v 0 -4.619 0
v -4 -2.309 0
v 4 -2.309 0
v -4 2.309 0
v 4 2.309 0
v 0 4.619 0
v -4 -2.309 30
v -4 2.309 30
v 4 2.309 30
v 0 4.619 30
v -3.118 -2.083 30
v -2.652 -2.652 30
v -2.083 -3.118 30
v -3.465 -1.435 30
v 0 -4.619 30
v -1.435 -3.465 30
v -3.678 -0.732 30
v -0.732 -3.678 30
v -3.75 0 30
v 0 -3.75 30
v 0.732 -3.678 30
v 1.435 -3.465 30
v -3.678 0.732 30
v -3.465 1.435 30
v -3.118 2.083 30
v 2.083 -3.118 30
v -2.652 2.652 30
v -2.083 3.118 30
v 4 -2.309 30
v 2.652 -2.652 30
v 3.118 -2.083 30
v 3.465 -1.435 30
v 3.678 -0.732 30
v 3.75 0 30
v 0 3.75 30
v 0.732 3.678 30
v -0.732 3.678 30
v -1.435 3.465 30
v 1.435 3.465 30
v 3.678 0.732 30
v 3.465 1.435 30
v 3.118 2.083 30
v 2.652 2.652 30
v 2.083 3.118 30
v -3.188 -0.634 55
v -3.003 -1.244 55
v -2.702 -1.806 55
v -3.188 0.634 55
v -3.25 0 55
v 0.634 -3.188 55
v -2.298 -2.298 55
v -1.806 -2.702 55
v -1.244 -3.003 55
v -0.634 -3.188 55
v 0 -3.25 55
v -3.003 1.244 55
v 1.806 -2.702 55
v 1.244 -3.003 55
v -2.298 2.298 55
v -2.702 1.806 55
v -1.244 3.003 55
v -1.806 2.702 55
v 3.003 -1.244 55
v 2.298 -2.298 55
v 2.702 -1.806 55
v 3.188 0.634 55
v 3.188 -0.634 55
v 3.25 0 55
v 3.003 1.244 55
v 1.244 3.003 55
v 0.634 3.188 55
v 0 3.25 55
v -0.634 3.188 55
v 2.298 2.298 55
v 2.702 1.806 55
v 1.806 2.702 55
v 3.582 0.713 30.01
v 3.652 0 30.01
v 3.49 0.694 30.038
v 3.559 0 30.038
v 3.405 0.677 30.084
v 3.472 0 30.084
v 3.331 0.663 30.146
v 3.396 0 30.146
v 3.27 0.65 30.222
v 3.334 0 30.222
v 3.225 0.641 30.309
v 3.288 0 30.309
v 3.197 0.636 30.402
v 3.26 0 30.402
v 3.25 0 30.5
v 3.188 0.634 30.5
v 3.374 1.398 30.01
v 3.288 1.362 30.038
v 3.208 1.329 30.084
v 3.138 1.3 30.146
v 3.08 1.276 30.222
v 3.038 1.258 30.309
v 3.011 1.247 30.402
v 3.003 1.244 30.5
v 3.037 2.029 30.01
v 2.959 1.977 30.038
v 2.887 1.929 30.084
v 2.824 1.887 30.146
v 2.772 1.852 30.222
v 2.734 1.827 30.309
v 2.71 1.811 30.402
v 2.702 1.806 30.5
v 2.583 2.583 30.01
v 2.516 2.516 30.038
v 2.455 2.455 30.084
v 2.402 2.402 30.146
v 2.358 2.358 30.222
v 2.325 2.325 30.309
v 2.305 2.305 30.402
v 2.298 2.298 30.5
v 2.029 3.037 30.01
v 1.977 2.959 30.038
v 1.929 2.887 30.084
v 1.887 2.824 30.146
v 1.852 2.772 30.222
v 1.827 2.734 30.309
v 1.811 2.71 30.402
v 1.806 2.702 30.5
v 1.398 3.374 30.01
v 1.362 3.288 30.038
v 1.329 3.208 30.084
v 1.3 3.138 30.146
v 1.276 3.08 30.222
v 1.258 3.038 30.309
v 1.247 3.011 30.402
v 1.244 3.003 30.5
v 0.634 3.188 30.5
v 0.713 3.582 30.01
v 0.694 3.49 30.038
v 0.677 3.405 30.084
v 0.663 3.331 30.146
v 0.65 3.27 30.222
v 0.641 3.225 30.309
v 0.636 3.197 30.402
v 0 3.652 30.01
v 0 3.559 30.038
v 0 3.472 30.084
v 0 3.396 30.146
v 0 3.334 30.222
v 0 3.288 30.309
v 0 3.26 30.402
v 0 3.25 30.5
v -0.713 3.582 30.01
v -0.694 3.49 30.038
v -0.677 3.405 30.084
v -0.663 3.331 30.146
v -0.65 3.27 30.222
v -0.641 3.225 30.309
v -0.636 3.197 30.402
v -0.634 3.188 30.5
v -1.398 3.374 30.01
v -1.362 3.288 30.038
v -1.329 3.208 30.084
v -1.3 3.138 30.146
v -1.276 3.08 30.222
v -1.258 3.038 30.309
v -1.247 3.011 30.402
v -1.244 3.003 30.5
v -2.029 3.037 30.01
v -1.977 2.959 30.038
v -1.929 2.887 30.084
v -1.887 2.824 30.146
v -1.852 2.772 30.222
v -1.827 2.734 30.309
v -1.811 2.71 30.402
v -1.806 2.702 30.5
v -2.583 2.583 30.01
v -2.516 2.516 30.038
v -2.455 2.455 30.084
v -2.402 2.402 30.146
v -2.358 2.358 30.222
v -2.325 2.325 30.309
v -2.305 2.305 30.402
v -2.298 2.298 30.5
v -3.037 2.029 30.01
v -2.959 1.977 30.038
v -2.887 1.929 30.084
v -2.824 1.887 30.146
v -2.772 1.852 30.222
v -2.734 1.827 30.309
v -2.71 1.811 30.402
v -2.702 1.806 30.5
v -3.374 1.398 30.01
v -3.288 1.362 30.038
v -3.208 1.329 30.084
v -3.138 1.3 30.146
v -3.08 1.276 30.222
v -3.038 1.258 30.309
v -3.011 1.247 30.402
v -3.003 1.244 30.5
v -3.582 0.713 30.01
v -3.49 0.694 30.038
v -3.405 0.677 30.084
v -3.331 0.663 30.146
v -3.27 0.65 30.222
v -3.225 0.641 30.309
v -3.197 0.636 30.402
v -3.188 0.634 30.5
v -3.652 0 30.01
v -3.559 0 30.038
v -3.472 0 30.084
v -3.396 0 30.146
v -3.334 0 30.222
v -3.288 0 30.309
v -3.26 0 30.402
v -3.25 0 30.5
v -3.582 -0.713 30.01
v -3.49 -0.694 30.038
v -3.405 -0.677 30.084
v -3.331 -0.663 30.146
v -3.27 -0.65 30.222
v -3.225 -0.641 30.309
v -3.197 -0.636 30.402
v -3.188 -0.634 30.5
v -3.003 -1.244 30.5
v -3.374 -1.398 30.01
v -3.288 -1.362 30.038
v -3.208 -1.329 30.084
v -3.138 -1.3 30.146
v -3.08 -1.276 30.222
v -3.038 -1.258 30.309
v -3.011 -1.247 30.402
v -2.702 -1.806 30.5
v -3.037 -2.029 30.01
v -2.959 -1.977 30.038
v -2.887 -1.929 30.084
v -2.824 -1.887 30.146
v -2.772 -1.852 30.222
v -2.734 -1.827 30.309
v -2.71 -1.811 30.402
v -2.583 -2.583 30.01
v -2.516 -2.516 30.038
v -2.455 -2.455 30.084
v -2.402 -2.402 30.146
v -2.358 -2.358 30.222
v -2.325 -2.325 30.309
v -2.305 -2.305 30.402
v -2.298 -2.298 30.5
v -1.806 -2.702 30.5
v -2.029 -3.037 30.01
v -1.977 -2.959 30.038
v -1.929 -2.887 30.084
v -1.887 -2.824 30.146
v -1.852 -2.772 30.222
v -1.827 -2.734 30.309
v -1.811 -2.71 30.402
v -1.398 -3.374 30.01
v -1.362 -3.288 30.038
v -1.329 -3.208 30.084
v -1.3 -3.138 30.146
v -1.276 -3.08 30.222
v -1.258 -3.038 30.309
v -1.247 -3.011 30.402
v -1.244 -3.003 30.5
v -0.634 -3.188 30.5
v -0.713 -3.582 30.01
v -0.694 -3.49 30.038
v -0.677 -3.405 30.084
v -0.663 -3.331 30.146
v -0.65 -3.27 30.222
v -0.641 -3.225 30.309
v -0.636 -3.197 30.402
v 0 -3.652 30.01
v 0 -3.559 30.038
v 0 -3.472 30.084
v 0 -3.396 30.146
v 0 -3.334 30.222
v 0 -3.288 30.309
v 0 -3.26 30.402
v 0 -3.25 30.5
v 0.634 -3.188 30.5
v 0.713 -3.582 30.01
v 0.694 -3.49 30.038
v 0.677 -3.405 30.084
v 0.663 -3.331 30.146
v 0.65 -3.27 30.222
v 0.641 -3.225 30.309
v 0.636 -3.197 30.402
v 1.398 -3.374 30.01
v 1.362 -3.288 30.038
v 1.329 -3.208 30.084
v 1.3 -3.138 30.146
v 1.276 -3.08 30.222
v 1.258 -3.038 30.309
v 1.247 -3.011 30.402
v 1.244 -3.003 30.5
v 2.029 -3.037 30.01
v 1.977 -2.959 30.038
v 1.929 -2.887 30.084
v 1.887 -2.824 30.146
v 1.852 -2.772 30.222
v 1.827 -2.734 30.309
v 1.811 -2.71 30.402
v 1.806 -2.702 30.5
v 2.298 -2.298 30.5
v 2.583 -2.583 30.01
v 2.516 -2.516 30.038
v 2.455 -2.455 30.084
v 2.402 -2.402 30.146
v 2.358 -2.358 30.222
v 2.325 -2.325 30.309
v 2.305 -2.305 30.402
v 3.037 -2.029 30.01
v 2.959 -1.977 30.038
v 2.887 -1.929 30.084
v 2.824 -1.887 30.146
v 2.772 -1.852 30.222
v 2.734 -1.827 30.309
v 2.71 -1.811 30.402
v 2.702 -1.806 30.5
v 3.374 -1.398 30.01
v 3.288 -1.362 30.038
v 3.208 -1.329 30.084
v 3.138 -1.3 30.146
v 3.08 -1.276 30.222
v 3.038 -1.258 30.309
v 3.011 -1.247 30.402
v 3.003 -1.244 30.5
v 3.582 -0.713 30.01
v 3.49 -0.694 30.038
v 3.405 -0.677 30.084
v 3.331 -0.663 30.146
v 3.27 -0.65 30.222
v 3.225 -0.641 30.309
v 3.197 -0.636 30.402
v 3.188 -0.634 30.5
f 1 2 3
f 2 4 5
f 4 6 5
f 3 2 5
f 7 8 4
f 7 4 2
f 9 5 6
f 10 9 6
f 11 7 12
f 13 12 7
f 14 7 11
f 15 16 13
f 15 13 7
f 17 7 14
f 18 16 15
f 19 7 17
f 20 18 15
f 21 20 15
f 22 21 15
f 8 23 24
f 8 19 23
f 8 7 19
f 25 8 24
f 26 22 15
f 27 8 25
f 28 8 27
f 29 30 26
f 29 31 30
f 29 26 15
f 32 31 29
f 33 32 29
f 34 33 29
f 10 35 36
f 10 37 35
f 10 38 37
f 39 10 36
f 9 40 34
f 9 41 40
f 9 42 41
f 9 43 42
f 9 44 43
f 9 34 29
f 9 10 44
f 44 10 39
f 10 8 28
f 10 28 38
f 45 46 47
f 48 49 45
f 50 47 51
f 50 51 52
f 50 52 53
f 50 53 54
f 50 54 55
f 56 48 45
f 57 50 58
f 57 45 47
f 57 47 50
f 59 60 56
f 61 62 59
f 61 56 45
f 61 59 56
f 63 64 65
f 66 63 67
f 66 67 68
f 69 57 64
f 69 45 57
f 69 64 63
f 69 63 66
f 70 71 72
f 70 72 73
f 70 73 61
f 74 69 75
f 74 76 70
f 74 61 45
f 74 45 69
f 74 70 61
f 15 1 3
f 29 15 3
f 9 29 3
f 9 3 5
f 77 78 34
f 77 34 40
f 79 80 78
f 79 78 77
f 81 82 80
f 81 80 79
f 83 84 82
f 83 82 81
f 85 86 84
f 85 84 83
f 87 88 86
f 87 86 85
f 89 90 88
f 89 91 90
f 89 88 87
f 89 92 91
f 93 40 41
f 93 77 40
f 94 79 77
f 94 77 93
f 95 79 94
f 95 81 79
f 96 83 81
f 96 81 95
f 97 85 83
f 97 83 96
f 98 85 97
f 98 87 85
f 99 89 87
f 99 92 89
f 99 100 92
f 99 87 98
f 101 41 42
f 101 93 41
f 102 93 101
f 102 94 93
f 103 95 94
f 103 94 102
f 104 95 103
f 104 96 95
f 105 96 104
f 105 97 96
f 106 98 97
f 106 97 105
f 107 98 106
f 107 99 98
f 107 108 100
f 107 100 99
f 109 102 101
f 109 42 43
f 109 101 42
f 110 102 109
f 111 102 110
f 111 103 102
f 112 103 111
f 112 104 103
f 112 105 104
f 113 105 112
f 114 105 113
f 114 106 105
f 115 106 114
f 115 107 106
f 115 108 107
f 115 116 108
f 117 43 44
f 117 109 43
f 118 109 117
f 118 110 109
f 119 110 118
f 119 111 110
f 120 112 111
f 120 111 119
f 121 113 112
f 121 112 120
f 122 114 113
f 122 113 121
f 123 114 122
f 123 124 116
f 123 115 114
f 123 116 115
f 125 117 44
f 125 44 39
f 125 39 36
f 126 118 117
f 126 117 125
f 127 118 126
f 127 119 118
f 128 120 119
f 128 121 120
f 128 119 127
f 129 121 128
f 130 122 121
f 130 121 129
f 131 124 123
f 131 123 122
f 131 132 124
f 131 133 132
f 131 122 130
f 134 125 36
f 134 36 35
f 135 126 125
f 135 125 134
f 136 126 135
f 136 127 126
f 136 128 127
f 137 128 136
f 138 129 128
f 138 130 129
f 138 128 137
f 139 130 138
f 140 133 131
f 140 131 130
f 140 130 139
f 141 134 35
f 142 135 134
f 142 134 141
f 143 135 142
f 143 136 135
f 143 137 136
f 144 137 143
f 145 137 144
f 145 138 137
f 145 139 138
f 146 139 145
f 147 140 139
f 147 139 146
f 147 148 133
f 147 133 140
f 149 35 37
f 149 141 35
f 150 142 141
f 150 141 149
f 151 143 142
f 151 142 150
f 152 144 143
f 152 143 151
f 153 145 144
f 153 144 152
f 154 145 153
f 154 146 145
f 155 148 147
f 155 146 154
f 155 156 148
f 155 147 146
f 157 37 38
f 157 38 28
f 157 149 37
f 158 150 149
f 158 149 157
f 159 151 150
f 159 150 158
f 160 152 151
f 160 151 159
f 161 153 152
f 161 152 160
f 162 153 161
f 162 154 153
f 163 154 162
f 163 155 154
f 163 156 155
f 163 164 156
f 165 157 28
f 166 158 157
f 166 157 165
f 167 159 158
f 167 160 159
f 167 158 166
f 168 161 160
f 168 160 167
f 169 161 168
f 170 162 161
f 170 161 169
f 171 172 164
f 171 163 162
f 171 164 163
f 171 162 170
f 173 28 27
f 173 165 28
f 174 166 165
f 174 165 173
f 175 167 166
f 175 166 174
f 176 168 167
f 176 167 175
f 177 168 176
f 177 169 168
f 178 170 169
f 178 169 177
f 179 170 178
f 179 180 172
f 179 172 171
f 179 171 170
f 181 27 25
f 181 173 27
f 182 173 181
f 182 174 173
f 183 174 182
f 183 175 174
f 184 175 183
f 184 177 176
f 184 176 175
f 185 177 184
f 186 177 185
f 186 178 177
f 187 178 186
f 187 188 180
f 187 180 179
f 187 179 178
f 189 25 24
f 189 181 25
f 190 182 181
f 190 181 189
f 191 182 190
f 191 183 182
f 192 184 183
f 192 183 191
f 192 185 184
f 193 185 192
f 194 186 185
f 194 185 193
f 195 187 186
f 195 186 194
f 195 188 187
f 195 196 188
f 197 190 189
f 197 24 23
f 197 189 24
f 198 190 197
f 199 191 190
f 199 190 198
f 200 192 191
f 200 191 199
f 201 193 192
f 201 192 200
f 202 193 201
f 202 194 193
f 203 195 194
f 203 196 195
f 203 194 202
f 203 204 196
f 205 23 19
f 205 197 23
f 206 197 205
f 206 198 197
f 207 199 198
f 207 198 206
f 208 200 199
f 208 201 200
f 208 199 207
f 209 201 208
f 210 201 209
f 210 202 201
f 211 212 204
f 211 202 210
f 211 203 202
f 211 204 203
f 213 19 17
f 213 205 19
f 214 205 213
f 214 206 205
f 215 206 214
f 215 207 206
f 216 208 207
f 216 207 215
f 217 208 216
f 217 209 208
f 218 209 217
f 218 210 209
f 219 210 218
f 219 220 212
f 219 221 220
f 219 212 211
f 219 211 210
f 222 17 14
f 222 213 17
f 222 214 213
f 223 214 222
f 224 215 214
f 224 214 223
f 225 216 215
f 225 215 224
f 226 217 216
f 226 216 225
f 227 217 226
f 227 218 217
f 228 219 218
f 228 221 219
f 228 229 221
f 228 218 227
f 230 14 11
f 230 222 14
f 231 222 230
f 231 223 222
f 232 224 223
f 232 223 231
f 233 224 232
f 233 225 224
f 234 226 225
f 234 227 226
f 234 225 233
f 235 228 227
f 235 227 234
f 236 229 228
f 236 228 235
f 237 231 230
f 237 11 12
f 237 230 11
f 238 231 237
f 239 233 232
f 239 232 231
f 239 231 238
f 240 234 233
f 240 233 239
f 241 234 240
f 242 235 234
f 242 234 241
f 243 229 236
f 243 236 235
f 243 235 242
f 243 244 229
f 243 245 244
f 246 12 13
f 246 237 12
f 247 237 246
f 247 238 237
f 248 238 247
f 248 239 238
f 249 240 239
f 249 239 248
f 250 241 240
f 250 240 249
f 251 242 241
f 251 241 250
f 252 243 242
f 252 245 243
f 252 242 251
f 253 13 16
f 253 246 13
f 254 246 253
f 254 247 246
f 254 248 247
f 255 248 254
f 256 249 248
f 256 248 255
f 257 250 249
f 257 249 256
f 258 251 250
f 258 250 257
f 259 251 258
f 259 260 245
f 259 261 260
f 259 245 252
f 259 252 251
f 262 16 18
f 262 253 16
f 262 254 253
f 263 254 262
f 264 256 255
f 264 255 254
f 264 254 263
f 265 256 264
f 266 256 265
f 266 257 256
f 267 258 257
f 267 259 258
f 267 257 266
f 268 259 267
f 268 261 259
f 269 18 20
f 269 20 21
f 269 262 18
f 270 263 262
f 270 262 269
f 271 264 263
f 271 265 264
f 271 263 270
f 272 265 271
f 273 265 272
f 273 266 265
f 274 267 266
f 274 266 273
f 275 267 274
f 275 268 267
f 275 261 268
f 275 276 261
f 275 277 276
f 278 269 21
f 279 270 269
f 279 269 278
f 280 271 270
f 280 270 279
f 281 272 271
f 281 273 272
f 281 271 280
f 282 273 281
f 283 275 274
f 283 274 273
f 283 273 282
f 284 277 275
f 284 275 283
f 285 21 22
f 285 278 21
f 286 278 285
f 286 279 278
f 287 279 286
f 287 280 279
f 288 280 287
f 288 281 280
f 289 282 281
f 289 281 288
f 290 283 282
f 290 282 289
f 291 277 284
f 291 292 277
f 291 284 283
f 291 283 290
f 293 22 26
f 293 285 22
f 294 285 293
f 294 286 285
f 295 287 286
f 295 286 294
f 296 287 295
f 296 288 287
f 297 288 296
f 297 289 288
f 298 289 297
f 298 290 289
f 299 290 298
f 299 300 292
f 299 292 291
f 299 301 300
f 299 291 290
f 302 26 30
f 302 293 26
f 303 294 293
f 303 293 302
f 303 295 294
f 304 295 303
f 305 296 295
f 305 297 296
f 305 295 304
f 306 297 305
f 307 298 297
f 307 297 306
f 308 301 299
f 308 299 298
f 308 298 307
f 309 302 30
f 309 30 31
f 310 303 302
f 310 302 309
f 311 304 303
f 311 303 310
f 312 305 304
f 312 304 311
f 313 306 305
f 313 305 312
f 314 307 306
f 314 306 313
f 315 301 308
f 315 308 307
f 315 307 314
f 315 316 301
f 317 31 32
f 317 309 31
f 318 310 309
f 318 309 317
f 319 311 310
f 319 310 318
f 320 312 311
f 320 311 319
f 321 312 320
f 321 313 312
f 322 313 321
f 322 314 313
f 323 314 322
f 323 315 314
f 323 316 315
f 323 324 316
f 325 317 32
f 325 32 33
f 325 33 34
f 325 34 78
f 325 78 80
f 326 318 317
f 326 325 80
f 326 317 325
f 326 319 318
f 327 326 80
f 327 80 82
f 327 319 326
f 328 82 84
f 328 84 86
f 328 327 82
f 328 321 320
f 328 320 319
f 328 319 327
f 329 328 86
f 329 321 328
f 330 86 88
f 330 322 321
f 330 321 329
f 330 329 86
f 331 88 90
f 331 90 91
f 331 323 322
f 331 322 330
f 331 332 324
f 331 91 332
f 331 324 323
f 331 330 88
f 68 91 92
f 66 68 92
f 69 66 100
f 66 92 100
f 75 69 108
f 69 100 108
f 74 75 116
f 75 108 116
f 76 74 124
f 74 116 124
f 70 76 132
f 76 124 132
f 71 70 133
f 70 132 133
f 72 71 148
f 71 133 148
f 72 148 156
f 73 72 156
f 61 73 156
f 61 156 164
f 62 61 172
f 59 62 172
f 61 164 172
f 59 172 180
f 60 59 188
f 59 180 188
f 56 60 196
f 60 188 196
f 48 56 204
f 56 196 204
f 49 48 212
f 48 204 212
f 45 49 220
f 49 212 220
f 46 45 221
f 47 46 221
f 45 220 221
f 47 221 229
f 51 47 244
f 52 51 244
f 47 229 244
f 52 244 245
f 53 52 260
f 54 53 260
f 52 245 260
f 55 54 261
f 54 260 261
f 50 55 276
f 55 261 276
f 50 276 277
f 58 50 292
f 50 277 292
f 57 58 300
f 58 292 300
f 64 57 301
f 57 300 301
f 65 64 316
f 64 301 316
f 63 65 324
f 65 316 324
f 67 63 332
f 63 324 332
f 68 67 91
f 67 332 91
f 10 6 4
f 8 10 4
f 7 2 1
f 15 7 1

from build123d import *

# Parameters (mm, degrees)
BOSS_EXTRU_1_DEPTH = 30
ESQUISSE2_R        = 3.25
BOSS_EXTRU_2_DEPTH = 25
CONG_1_R           = 0.5


with BuildPart() as part:
    # Esquisse1 → Boss.-Extru.1 (new body)
    with BuildSketch(Plane.XY):
        Polygon((-4, 2.309401077), (-4, -2.309401077), (0, -4.618802154), (4, -2.309401077), (4, 2.309401077), (0, 4.618802154), align=None)
    extrude(amount=BOSS_EXTRU_1_DEPTH)

    # Esquisse2 → Boss.-Extru.2 (add)
    with BuildSketch(Plane.XY.offset(30)):
        Circle(ESQUISSE2_R)
    extrude(amount=BOSS_EXTRU_2_DEPTH)

    # Congé1
    cong_1_edges = [part.edges().sort_by_distance(p)[0] for p in [
        (-3.25, 0, 30),
    ]]
    fillet(cong_1_edges, radius=CONG_1_R)


solid = part.part
